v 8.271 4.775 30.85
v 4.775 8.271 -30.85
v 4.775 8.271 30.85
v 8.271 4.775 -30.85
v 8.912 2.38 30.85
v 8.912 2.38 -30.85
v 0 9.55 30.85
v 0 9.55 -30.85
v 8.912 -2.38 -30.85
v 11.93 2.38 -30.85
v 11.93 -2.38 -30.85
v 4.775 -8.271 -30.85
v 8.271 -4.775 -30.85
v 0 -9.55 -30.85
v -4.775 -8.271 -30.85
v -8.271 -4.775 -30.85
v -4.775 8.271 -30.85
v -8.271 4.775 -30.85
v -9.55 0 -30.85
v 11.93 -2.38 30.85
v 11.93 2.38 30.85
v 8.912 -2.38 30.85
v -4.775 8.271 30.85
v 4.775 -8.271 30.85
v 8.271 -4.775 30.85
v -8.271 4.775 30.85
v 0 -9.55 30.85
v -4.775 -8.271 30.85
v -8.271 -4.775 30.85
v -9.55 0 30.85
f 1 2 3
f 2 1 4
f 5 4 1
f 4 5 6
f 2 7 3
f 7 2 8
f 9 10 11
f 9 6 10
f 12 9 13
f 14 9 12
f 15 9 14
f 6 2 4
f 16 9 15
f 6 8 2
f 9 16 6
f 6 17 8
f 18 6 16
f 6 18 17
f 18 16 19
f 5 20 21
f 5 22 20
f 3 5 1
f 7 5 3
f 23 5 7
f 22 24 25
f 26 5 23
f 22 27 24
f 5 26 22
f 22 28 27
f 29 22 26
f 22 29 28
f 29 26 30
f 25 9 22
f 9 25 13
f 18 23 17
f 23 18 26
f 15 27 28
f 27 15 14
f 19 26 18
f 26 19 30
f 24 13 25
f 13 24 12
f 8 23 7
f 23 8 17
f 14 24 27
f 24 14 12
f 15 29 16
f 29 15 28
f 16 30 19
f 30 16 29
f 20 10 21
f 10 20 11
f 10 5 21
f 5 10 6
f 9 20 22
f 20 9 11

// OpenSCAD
/*
Shaft Diameter 	3/4 in. / 19.1 mm
Shaft length (in.) 	2.43 in. / 61.7 mm
Keyway 	3/16 in. / 4.76 mm
https://www.harborfreight.com/65-hp-212cc-ohv-horizontal-shaft-gas-engine-epa-69730.html

*/
$fn=12;
diameter=19.1;
length=61.7;
keyway=4.76;

color("blue")
cylinder(h=length, d=diameter, center=true);

color("red")
translate([diameter/2, 0, 0])
cube([keyway, keyway, length], center=true);

/*
translate([ 0.00, 0.00, length/2]) {
color("red")
{
    linear_extrude(length, center=true) 
    {
    circle(d=diameter);
    }
}
translate([diameter/2, 0, 0]) {
    color("blue")
    {
        linear_extrude(length, center=true)
        {
            square(4.76, center=true);
        }
    }
}
}
*/
    
/*
,        color("red")
        {
            linear_extrude(length*1.1, center=true)
            {
                square(4.76, center=true);
            }
        }
    }
    */
